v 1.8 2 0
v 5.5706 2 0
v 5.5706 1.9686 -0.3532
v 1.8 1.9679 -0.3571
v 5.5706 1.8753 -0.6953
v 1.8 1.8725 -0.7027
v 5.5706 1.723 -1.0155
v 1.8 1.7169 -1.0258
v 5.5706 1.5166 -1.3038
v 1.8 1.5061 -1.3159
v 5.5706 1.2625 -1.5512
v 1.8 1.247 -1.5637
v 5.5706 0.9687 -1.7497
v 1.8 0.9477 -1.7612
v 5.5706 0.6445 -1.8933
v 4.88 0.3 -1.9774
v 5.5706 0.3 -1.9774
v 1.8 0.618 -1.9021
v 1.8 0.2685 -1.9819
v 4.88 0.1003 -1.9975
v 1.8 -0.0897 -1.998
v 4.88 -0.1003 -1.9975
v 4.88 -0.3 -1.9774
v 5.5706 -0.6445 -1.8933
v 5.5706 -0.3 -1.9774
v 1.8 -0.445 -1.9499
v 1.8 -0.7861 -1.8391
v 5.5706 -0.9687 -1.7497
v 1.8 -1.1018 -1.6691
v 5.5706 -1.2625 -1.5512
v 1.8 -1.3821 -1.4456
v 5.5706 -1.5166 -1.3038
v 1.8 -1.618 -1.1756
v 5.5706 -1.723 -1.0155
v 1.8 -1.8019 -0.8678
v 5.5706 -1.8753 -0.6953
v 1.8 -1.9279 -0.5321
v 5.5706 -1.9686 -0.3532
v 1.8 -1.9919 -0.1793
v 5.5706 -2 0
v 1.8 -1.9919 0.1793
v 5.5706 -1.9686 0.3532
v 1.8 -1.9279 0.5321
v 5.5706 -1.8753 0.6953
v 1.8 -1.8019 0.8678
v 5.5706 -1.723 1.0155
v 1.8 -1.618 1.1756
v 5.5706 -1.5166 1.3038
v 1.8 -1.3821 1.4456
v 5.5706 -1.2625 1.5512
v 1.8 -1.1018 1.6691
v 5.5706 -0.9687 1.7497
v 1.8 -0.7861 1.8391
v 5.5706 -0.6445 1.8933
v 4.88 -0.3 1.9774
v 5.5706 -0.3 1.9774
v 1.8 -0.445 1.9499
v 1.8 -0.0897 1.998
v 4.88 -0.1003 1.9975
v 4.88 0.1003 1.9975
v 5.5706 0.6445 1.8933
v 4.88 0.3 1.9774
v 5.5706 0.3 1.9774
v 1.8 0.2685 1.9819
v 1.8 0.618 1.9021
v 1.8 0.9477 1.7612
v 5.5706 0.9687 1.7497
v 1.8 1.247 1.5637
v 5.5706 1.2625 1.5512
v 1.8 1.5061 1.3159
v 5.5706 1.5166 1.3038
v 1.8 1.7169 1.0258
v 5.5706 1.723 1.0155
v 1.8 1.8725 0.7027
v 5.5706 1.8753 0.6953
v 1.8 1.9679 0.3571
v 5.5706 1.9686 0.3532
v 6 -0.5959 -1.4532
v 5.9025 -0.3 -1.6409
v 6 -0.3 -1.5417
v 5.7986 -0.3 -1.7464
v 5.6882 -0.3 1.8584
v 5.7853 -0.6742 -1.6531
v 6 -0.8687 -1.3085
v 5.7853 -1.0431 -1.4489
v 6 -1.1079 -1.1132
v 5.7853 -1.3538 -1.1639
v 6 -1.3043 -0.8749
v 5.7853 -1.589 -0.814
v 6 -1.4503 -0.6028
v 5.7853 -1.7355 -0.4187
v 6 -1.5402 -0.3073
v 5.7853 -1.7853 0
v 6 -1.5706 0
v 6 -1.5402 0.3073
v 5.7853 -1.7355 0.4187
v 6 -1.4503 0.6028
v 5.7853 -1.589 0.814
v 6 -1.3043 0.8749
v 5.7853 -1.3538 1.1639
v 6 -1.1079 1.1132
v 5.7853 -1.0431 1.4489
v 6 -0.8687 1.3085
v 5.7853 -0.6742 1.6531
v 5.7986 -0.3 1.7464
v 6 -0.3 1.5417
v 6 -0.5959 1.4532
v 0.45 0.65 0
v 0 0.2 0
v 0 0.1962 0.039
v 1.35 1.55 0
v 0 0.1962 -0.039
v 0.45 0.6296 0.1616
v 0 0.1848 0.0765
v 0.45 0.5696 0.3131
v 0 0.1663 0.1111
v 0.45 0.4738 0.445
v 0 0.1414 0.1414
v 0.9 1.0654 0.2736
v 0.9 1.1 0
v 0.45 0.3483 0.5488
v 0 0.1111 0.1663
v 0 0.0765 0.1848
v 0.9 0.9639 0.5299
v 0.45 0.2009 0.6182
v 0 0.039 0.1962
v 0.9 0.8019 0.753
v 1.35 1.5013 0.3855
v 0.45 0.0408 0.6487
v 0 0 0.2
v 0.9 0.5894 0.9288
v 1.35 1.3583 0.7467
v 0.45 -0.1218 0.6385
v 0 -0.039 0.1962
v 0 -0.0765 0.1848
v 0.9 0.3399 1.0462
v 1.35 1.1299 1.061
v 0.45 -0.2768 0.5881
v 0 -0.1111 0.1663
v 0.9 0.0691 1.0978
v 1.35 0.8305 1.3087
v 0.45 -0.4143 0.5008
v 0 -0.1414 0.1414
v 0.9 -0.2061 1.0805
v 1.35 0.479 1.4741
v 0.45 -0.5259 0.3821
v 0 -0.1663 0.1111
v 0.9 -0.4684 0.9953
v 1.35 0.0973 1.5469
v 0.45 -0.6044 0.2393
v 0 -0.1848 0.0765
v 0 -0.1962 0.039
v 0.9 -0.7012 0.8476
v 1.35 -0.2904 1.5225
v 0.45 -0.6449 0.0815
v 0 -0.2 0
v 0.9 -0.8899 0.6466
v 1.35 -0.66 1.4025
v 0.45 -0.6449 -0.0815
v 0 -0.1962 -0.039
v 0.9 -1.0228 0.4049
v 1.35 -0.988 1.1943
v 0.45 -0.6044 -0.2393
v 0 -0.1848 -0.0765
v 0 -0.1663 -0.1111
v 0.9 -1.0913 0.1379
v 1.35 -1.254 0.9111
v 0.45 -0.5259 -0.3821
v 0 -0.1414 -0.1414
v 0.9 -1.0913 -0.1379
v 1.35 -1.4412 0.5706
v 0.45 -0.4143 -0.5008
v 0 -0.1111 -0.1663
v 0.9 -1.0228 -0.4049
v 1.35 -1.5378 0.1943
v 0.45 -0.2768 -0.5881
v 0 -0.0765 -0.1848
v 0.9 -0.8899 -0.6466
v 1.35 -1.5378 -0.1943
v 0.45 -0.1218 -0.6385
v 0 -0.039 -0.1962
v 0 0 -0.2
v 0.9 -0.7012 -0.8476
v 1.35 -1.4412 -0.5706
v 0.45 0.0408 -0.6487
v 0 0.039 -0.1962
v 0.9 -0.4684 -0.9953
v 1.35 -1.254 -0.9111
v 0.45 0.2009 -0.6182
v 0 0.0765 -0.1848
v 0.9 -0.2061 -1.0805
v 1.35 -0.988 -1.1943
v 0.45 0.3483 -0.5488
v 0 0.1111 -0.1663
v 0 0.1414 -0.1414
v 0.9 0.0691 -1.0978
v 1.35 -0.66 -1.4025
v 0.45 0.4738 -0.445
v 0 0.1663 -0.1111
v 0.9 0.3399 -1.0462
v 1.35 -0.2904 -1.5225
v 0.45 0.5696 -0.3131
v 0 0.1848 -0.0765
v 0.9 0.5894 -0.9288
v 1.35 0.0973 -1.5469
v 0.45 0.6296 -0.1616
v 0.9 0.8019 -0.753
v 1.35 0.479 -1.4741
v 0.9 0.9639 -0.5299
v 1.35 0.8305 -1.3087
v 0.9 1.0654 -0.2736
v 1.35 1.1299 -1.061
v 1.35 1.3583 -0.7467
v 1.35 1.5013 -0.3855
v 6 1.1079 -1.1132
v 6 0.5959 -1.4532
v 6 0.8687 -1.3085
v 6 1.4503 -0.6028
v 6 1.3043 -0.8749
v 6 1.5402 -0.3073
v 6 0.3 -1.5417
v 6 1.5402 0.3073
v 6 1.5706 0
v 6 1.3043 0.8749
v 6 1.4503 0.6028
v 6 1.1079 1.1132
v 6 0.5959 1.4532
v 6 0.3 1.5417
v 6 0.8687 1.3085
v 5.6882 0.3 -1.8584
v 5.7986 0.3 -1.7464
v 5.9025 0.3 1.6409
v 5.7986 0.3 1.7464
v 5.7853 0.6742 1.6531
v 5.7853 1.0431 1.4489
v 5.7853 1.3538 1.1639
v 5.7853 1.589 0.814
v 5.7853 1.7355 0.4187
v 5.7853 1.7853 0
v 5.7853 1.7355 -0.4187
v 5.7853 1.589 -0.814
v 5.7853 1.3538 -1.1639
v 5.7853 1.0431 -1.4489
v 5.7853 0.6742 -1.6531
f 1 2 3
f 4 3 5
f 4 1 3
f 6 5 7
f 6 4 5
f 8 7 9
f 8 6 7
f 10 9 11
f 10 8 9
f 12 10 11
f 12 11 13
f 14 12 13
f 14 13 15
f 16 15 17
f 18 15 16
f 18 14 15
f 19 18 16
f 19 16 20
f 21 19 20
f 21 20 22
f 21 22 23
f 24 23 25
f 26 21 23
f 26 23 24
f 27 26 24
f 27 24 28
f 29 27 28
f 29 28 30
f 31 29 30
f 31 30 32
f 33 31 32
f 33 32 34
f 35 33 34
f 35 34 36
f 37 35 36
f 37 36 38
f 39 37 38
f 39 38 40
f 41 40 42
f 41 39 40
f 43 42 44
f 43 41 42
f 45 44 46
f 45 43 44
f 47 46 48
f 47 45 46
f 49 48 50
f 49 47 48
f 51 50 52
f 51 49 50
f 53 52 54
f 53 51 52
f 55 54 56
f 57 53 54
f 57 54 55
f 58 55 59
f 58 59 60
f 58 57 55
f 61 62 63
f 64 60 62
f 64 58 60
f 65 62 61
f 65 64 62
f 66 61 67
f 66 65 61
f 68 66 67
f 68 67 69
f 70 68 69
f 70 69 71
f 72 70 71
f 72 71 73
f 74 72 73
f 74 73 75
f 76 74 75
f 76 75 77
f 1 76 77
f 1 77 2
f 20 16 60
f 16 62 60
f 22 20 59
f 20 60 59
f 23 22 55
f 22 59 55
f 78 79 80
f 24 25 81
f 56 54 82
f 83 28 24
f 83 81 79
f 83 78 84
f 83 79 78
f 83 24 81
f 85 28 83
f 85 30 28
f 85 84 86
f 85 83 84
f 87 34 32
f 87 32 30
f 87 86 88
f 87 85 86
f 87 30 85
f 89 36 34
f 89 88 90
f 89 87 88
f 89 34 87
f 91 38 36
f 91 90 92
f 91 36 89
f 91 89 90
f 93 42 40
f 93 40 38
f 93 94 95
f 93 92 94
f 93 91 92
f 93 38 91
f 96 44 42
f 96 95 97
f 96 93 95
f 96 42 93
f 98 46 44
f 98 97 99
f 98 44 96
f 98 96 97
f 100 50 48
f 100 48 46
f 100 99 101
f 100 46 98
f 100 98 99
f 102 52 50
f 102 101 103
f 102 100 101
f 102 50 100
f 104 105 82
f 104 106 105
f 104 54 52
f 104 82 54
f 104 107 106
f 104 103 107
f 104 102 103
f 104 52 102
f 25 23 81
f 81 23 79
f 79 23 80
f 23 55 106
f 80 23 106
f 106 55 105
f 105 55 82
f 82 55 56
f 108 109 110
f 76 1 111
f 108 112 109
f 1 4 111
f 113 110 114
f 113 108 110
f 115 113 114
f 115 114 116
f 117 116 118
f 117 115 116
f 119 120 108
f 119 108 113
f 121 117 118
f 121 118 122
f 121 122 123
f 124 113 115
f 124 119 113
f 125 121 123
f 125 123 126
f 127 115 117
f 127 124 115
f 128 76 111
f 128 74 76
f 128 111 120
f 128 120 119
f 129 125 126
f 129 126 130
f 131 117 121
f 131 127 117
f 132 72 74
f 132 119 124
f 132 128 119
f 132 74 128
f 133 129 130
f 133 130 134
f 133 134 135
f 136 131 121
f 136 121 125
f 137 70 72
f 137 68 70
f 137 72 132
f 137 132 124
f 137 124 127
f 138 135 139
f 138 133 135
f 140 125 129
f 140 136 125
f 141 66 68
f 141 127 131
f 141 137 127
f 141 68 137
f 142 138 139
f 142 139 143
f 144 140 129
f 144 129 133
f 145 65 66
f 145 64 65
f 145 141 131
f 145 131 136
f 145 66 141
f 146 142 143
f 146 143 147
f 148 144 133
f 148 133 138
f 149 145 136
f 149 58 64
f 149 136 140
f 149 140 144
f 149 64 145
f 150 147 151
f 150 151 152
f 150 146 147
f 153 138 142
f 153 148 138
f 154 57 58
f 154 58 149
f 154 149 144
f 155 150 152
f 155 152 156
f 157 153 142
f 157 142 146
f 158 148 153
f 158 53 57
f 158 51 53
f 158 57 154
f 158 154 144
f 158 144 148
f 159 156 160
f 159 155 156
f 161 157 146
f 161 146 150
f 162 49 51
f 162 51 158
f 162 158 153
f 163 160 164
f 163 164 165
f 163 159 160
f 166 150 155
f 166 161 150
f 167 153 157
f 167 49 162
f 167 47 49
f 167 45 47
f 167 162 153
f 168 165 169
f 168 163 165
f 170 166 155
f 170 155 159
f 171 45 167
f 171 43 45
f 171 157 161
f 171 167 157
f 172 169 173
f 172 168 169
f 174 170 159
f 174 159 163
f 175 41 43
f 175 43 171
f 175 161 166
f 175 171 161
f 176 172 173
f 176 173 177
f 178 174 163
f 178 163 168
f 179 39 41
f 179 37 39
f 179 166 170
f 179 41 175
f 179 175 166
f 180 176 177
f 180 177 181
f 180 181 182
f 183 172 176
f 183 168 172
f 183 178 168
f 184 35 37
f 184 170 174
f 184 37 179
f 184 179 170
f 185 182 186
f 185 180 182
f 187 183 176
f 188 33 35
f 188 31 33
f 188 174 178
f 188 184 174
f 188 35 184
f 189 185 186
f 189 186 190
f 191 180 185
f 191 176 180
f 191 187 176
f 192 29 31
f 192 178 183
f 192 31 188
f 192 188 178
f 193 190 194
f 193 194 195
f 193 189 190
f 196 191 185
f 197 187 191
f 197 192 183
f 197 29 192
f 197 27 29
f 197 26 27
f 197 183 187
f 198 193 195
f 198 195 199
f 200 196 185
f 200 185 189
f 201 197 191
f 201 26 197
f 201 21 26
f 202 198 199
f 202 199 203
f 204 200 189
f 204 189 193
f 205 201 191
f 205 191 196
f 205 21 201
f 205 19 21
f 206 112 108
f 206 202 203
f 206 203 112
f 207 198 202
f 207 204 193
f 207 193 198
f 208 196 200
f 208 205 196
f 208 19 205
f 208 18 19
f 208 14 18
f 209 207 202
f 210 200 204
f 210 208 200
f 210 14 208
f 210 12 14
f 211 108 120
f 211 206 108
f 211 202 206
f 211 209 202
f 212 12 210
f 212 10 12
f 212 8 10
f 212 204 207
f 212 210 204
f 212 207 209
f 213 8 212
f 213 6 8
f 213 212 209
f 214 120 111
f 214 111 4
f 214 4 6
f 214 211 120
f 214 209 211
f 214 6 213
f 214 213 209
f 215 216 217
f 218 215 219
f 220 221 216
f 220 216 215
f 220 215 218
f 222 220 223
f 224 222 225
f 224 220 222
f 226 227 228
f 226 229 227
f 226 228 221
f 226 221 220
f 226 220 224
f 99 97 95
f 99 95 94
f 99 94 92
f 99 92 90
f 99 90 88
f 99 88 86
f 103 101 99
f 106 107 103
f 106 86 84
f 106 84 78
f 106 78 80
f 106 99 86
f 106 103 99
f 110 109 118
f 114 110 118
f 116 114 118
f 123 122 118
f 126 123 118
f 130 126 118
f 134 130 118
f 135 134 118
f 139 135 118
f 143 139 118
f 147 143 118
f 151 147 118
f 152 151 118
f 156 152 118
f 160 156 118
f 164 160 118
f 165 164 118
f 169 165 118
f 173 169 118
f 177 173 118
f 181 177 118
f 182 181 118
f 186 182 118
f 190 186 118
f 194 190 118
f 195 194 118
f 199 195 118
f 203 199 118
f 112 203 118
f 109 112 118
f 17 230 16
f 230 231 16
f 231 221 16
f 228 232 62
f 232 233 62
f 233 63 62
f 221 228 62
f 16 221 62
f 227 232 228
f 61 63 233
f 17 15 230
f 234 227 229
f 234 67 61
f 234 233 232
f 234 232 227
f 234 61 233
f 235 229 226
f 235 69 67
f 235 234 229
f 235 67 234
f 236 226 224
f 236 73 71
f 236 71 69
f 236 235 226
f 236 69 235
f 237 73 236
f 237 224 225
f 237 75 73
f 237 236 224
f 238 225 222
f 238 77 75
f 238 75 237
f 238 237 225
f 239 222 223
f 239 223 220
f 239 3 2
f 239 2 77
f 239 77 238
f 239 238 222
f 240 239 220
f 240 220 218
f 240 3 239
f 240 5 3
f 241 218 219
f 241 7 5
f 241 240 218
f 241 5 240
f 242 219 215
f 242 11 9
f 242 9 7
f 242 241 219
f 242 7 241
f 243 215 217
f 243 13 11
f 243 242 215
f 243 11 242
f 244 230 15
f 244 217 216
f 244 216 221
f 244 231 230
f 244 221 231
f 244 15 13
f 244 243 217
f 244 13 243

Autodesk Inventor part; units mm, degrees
ref_plane "YZ Plane" through (0, 0, 0) normal (1, 0, 0) x (0, 1, 0)
ref_plane "XZ Plane" through (0, 0, 0) normal (0, 1, 0) x (-1, 0, 0)
sketch "Sketch1" plane through (0, 0, 0) normal (0, 0, 1) x (1, 0, 0)
  line L0 (0, 0) -> (6, 0)
  line L1 (6, 0) -> (6, 2)
  line L2 (6, 2) -> (0, 2)
  line L3 (0, -0.4) -> (0, 2.4) projected
  line L4 (0, 2) -> (0, 0)
  dimension "d0" = 4
  dimension "d2" = 6
revolve "Body" add sketch "Sketch1" angle 360 about axis through (0, 0, 0) along (1, 0, 0)
chamfer "Chamfer1" distance 0.4294 angle 45 1 edges at (6, -2, 0) measured on face at (6, 0.2007, 0.5552)
sketch "Sketch2" plane through (0, 0, 0) normal (0, 0, 1) x (1, 0, 0)
  line L0 (6, 1.5706) -> (6, -1.5706) projected
  line L1 (4.656, 0) -> (6.224, 0) projected
  line L2 (6, 0.3) -> (4.88, 0.3)
  line L3 (4.88, 0.3) -> (4.88, 0)
  line L4 (4.88, -0.3) -> (4.88, 0)
  line L5 (4.88, -0.3) -> (6, -0.3)
  dimension "d8" = 0.3
  dimension "d9" = 1.12
extrude "Slot1" cut sketch "Sketch2" against normal mid plane 4
thread "Thread" size "M4x0.7" class "6g" standard "ISO Metric profile" length 6
chamfer "Chamfer2" distance 1.8 angle 45 1 edges at (0, -2, 0) measured on face at (1.8569, -0.8723, 1.7998)
ref_plane "Work Plane1" through (3, 0, 0) normal (0, 0, 1) x (1, 0, 0)
equation "\"d0\" = NND"
equation "\"d2\" = NLG"
equation "\"d8\" = 0.5 * SBR"
equation "\"d9\" = STI"
equation "\"d10\" = NND"
equation "\"d3\" = -0.5 * GD1 + 0.5 * NND"
equation "\"d4\" = FAWI"
equation "\"d34\" = -0.5 * GD1 + 0.5 * NND"
equation "\"d5\" = NLG"
equation "\"d14\" = FAWI"
equation "\"NND\" = 4"
equation "\"NLG\" = 6"
equation "\"FAWI\" = 45deg"
equation "\"GD1\" = THREADDIA - 1.2269 * PTC"
equation "\"FAWI1\" = 45deg"
equation "\"SPD\" = 0.4"
equation "\"SBR\" = 0.6"
equation "\"STI\" = 1.12"
equation "\"GUL\" = 0.61345 * PTC"
equation "\"THREADDIA\" = 4"
equation "\"TOA\" = 30deg"
equation "\"PTC\" = 0.7"
equation "\"GAL\" = 0.61345 * PTC"
equation "\"THREADDESC\" = 1.2345"
properties part number "ISO 7434 - M4x6" material "Stainless Steel, 440C"
